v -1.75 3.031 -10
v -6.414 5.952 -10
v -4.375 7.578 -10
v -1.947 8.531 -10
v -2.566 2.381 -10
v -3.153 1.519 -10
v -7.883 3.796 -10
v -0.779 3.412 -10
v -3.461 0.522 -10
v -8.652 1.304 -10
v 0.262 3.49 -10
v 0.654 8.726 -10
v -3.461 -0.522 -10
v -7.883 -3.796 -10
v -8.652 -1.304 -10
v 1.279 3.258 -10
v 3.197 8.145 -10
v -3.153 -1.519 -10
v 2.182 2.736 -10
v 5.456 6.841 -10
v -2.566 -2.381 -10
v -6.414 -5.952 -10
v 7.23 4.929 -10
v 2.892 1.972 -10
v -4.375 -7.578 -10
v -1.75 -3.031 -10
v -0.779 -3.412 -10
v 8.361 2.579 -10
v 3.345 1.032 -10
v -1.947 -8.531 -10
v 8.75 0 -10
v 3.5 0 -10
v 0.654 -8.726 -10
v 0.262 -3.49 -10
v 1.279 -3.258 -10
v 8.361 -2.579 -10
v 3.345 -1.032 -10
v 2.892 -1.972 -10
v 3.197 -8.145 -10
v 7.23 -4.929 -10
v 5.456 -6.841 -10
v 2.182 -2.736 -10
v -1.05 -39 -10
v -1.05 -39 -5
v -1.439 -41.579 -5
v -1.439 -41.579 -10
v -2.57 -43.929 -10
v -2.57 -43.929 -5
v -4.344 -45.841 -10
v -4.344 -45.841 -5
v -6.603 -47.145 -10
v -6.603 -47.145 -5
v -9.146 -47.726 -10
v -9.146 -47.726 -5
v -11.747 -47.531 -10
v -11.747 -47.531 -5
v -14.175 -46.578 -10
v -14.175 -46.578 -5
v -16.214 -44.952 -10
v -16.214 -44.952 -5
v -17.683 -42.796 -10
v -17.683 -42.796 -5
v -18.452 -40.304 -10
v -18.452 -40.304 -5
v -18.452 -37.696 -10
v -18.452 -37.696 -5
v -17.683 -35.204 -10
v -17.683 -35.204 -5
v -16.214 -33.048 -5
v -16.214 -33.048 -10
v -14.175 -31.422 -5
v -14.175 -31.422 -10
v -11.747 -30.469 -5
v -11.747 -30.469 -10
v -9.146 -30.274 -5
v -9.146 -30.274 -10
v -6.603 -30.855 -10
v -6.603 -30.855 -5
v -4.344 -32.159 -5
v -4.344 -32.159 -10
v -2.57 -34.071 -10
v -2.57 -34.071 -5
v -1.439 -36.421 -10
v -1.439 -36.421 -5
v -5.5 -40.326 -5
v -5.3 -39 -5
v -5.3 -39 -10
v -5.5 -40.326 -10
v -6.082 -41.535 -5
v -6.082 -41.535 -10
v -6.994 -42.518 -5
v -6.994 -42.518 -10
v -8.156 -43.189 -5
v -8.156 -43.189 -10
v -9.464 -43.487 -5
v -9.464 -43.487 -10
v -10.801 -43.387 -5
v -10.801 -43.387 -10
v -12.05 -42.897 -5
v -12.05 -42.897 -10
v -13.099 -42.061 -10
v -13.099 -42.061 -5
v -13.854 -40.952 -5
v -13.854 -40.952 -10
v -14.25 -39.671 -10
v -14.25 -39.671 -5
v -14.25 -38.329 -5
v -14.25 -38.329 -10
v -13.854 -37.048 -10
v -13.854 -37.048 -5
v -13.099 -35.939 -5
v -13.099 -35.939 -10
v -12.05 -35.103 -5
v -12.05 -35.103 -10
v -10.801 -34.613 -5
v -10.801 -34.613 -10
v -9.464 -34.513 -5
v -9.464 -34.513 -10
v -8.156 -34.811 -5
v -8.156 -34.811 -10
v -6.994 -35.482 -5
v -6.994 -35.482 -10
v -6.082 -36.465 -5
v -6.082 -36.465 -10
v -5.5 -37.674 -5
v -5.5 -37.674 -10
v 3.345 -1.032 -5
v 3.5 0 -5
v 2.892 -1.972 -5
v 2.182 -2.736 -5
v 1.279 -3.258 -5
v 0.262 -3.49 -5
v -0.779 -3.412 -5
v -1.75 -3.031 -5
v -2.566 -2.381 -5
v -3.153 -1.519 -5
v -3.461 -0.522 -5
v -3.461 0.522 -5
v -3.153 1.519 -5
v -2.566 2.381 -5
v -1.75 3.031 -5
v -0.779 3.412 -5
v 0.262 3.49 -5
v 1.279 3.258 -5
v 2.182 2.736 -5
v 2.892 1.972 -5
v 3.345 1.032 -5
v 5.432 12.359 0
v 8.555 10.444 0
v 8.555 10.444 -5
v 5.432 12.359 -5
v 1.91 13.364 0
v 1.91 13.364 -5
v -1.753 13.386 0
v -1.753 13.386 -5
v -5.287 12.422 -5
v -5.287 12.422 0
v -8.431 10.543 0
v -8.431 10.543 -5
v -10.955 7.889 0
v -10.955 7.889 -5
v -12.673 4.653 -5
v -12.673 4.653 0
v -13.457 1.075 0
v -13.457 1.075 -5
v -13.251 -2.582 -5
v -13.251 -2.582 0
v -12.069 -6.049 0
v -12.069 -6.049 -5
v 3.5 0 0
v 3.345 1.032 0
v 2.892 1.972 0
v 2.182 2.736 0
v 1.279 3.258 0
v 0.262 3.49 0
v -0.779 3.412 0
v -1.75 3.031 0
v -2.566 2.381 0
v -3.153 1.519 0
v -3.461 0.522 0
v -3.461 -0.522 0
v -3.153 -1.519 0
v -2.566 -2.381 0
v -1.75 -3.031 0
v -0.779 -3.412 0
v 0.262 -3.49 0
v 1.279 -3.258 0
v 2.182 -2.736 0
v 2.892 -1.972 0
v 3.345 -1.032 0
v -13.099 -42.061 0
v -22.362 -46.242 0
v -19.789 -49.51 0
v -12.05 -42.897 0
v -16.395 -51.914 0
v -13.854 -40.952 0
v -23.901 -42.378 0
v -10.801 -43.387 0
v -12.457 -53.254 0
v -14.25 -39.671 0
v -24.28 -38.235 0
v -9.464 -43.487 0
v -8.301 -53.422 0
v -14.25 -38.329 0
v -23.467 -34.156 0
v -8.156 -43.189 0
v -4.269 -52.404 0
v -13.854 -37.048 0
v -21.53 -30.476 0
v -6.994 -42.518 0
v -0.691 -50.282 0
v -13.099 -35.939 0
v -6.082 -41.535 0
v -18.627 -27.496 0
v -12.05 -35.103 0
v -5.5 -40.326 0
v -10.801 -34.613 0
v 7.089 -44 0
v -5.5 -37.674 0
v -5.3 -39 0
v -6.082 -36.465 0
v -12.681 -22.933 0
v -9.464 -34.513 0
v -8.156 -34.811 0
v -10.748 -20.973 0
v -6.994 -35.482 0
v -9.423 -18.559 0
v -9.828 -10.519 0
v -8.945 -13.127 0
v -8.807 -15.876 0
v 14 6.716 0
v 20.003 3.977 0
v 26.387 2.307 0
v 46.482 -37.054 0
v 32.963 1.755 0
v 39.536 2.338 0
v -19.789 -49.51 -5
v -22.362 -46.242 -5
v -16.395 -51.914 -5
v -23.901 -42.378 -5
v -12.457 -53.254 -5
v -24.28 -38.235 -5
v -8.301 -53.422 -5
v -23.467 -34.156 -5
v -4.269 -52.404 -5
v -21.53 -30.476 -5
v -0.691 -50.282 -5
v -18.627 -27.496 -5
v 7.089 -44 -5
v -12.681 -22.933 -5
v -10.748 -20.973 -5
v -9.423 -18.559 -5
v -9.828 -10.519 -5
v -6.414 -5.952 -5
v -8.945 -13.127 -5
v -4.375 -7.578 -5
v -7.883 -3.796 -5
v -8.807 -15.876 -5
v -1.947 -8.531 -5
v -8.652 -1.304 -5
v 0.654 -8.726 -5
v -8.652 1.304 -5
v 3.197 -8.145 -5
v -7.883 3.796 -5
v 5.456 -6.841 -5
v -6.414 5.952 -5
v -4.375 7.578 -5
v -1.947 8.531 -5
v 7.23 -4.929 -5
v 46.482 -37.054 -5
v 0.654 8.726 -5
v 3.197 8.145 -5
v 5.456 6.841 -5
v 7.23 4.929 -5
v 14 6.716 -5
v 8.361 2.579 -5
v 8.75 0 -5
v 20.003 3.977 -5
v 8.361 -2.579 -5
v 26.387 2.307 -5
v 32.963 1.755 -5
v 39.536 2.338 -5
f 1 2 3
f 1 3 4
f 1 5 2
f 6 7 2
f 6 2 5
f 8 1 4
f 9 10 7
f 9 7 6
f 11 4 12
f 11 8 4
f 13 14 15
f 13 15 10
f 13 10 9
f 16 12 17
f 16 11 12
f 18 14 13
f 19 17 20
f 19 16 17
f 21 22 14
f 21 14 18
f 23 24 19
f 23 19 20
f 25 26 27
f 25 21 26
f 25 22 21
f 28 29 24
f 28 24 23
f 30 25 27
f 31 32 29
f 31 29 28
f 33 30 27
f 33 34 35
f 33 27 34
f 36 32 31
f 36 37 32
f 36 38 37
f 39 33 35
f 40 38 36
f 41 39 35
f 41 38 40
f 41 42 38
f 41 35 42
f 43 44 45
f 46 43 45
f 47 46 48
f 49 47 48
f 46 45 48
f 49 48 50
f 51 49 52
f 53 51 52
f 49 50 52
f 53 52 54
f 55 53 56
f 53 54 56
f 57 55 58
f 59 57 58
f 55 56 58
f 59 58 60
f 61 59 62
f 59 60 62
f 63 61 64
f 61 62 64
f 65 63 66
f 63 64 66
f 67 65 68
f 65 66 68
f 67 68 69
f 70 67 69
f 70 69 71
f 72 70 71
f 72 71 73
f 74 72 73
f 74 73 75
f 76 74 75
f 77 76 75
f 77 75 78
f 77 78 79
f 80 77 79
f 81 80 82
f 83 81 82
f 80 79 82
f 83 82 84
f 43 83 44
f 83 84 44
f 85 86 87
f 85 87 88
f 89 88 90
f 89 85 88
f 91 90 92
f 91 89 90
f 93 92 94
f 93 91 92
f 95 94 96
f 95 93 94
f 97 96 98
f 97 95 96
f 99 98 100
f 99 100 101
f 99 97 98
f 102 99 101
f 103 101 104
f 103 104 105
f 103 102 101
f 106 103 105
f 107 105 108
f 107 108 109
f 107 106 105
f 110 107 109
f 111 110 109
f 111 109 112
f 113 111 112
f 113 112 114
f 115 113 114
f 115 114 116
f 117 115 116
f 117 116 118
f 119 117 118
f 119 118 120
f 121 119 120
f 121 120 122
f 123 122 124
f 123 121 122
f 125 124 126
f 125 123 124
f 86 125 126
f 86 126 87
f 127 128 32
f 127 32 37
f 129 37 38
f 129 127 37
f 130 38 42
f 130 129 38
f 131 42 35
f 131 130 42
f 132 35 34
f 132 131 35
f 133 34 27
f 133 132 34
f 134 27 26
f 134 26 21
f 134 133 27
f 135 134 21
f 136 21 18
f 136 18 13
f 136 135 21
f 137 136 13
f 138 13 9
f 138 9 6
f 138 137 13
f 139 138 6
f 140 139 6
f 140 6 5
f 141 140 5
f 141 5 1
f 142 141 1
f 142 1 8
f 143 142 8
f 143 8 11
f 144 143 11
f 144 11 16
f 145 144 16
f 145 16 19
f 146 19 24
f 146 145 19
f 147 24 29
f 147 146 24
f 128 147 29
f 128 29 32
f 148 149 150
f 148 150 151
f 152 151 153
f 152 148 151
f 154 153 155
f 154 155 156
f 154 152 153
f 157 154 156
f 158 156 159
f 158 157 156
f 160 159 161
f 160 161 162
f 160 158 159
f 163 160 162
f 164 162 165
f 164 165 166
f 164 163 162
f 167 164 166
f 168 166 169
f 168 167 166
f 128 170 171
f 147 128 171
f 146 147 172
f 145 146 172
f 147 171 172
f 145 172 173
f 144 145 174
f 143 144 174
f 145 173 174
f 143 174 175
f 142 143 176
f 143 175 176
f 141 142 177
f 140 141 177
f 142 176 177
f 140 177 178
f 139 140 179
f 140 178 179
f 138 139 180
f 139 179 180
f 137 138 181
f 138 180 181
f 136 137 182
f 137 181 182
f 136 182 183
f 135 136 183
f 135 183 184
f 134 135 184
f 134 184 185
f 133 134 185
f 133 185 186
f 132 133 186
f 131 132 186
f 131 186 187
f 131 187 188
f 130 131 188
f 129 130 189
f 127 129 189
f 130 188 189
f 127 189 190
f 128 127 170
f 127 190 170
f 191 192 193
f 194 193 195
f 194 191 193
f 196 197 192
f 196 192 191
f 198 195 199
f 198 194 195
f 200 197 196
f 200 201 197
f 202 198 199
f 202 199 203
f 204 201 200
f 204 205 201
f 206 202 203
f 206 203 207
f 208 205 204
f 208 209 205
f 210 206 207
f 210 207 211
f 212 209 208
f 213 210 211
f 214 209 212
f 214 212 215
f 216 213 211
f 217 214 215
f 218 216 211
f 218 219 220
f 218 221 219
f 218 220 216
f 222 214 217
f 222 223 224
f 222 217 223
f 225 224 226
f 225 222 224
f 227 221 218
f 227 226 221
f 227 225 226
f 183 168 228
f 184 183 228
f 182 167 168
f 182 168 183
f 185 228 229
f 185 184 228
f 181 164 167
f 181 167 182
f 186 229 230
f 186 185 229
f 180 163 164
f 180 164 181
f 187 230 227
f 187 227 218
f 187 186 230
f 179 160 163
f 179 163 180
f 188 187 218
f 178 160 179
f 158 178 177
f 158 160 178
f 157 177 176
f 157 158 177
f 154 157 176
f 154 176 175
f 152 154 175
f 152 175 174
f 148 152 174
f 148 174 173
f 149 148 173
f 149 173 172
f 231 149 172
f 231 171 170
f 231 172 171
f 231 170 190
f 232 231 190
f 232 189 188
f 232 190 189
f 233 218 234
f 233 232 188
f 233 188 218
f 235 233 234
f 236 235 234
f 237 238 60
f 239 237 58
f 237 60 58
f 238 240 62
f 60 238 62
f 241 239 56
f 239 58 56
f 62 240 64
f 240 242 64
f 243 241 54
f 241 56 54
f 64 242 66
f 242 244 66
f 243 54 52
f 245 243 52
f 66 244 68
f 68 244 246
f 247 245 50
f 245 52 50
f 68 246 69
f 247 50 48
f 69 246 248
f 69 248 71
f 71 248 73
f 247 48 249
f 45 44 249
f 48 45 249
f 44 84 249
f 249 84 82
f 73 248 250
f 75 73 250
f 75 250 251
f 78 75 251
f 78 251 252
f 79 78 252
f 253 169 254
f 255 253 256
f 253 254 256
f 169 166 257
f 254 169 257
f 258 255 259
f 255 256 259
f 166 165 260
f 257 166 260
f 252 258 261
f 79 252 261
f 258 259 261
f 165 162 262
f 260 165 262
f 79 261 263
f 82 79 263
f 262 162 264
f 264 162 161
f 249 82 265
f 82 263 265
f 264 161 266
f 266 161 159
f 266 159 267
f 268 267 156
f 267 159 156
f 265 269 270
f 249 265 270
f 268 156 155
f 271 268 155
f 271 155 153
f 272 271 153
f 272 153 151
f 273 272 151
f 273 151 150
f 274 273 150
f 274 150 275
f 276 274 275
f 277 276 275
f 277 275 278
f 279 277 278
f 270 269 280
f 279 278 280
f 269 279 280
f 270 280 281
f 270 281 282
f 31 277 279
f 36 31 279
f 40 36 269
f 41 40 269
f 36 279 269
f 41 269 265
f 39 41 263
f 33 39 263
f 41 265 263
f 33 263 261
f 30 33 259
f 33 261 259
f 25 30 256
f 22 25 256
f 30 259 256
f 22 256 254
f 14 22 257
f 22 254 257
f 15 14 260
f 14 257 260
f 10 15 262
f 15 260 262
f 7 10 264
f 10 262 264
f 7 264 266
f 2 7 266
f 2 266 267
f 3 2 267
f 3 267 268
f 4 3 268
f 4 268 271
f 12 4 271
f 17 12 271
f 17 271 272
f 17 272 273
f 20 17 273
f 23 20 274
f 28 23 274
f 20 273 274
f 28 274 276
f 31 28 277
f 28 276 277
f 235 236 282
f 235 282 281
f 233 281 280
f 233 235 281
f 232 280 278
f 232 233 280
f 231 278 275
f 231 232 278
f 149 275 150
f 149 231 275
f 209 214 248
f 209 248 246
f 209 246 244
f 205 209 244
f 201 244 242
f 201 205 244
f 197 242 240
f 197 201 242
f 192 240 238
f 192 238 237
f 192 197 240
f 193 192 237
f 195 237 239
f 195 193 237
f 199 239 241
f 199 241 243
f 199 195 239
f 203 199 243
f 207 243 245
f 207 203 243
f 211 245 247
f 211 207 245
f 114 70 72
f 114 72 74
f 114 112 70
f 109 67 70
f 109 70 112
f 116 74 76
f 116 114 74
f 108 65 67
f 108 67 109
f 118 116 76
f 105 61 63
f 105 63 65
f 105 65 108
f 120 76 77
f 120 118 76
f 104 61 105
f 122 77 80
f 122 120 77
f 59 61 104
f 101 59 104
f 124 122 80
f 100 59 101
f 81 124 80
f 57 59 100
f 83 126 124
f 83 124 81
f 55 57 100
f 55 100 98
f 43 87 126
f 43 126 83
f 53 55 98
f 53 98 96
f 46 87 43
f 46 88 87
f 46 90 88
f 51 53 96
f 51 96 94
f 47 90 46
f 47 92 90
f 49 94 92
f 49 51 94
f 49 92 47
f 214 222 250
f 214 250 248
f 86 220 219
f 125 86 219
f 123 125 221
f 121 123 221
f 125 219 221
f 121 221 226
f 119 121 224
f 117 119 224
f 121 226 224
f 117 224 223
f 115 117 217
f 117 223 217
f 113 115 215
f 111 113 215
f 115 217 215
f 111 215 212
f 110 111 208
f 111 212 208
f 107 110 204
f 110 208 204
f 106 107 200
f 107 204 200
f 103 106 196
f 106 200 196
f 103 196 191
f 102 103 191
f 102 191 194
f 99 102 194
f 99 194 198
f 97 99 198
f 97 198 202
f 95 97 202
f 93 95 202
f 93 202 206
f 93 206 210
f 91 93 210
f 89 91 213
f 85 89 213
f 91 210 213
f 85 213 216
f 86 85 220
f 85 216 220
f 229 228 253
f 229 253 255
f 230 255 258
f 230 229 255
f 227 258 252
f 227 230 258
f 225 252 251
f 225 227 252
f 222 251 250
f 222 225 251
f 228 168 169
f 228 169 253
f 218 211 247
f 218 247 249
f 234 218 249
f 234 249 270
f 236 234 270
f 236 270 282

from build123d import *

# Parameters (mm, degrees)
SKETCH1_R           = 3.5
SKETCH1_R_2         = 4.5
BOSS_EXTRUDE1_DEPTH = 5
SKETCH2_R           = 8.75
SKETCH2_R_2         = 3.5
SKETCH2_R_3         = 4.5
BOSS_EXTRUDE2_DEPTH = 5


with BuildPart() as part:
    # Sketch1 → Boss-Extrude1 (new body)
    with BuildSketch(Plane.XY):
        with BuildLine():
            Line((-12.068862554, -6.04917818), (-9.828426191, -10.519127274))
            ThreePointArc((-9.828426191, -10.519127274), (-9.022245749, -17.239185417), (-12.680657026, -22.933492686))
            Line((-12.680657026, -22.933492686), (-18.627117662, -27.496435605))
            ThreePointArc((-18.627117662, -27.496435605), (-21.193595331, -47.96861112), (-0.691265287, -50.281886009))
            Line((-0.691265287, -50.281886009), (7.089345754, -44))
            Line((7.089345754, -44), (46.481655875, -37.054072893))
            Line((46.481655875, -37.054072893), (39.535728768, 2.338237227))
            ThreePointArc((39.535728768, 2.338237227), (23.15933572, 3.004735652), (8.554710295, 10.443511467))
            ThreePointArc((8.554710295, 10.443511467), (-8.431460103, 10.543267071), (-12.068862554, -6.04917818))
        make_face()
        Circle(SKETCH1_R, mode=Mode.SUBTRACT)
        with Locations((-9.8, -39)):
            Circle(SKETCH1_R_2, mode=Mode.SUBTRACT)
    extrude(amount=-BOSS_EXTRUDE1_DEPTH)

    # Sketch2 → Boss-Extrude2 (add)
    # profile 1 of 2: a face of its own
    with BuildSketch(Plane(origin=(0, 0, -5), x_dir=(-1, 0, 0), z_dir=(0, 0, -1))):
        with Locations(Location((0, 0, 0), (0, 0, 180))):
            Circle(SKETCH2_R)
        with Locations(Location((0, 0, 0), (0, 0, 180))):
            Circle(SKETCH2_R_2, mode=Mode.SUBTRACT)
    # profile 2 of 2: a face of its own
    with BuildSketch(Plane(origin=(0, 0, -5), x_dir=(-1, 0, 0), z_dir=(0, 0, -1))):
        with Locations(Location((9.8, -39, 0), (0, 0, 180))):
            Circle(SKETCH2_R)
        with Locations(Location((9.8, -39, 0), (0, 0, 180))):
            Circle(SKETCH2_R_3, mode=Mode.SUBTRACT)
    extrude(amount=BOSS_EXTRUDE2_DEPTH)


solid = part.part
